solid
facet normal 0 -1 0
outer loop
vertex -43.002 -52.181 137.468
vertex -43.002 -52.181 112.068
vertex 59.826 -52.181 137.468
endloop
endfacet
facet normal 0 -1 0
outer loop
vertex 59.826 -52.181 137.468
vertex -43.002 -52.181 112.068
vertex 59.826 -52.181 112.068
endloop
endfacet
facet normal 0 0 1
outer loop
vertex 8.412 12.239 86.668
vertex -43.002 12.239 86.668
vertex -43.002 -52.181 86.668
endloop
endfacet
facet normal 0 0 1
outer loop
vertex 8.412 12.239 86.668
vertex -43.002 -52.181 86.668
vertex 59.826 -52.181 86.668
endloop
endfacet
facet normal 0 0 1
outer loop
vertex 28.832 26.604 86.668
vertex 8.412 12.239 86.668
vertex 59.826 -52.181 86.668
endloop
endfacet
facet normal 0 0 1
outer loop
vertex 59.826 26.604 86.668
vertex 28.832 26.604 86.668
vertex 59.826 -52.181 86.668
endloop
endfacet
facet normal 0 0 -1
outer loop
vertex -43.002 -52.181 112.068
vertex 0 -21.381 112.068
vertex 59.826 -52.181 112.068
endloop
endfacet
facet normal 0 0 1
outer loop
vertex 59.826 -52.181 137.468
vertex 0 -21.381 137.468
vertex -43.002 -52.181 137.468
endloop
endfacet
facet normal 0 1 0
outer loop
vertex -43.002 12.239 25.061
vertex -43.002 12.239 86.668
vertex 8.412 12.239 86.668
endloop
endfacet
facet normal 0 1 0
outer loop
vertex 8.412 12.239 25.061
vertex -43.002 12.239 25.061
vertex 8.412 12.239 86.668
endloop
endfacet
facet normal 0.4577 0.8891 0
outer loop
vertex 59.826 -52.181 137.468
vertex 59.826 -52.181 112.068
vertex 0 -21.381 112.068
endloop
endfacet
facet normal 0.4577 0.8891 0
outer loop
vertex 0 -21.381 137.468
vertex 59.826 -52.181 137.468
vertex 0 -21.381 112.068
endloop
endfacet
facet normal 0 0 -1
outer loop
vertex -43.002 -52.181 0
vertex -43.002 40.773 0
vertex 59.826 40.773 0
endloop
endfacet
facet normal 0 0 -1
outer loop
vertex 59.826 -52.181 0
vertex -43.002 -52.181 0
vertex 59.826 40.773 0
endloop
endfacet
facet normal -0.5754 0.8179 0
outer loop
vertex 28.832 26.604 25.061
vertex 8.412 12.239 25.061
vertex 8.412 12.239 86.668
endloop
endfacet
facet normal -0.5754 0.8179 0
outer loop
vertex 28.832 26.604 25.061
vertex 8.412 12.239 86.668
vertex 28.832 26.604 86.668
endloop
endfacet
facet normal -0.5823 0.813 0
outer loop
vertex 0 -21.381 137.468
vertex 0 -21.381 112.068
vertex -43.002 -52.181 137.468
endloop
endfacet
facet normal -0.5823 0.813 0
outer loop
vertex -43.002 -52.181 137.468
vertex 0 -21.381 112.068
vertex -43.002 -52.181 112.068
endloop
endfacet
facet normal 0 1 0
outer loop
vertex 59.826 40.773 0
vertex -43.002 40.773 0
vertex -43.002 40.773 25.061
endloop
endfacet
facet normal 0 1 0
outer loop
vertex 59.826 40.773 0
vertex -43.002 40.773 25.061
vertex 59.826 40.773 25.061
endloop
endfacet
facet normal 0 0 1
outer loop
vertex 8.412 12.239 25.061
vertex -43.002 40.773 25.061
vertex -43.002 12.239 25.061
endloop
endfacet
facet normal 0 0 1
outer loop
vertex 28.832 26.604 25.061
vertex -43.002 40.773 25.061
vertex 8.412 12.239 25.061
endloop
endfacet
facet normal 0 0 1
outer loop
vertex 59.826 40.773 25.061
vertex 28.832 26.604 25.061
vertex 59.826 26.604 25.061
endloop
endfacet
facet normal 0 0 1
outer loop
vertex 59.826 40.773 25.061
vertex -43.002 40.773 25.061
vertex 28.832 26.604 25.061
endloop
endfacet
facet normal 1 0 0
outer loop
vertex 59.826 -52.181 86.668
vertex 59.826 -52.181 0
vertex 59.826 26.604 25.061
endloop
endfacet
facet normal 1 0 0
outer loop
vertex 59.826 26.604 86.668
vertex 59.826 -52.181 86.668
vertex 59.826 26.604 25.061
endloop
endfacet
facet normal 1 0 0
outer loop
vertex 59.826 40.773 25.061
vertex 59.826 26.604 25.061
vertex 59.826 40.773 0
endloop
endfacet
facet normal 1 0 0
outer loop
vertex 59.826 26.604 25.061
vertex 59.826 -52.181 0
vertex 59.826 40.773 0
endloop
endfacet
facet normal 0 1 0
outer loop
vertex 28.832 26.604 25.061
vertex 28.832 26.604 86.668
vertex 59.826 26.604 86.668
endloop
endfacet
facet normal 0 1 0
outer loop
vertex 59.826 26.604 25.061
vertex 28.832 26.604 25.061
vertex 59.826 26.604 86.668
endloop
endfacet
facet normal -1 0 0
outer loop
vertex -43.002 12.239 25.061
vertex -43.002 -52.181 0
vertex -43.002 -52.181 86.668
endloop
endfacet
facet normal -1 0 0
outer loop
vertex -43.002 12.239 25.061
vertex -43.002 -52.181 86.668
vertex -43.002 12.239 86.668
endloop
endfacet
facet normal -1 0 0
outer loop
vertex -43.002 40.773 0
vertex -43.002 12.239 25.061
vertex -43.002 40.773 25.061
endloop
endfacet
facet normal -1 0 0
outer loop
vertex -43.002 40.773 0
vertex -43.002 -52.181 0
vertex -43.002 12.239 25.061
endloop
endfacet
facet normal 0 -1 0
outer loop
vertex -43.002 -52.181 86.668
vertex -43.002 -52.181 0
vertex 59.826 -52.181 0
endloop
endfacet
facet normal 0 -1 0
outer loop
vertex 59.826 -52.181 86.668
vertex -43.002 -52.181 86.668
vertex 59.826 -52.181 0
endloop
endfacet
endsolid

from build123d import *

# Parameters (mm, degrees)
F0_W     = 102.827347815
F0_H     = 92.9536521435
F1_DEPTH = 86.6684615612
F3_DEPTH = 61.6070646793
F6_DEPTH = 25.4


with BuildPart() as f1:
    # F0 (on Top) → F1 (new body)
    with BuildSketch(Plane.XY):
        with Locations((8.411873132, -5.7041868567)):
            Rectangle(F0_W, F0_H)
    extrude(amount=F1_DEPTH)

    # F2 (on face) → F3 (cut)
    with BuildSketch(Plane.XY.offset(86.6684615612)):
        Polygon((-43.0018007755, 40.772639215), (-43.0018007755, 12.2389271855), (8.411873132, 12.2389271855), (28.8321375847, 26.6043245792), (59.8255470395, 26.6043245792), (59.8255470395, 40.772639215), align=None)
    extrude(amount=-F3_DEPTH, mode=Mode.SUBTRACT)


with BuildPart() as f6:
    # F5 (on offset) → F6 (new body)
    with BuildSketch(Plane.XY.offset(112.0684615612)):
        Polygon((-43.0018007755, -52.1810129285), (59.8255470395, -52.1810129285), (0, -21.3810950518), align=None)
    extrude(amount=F6_DEPTH)


solid = Compound([f1.part, f6.part])
